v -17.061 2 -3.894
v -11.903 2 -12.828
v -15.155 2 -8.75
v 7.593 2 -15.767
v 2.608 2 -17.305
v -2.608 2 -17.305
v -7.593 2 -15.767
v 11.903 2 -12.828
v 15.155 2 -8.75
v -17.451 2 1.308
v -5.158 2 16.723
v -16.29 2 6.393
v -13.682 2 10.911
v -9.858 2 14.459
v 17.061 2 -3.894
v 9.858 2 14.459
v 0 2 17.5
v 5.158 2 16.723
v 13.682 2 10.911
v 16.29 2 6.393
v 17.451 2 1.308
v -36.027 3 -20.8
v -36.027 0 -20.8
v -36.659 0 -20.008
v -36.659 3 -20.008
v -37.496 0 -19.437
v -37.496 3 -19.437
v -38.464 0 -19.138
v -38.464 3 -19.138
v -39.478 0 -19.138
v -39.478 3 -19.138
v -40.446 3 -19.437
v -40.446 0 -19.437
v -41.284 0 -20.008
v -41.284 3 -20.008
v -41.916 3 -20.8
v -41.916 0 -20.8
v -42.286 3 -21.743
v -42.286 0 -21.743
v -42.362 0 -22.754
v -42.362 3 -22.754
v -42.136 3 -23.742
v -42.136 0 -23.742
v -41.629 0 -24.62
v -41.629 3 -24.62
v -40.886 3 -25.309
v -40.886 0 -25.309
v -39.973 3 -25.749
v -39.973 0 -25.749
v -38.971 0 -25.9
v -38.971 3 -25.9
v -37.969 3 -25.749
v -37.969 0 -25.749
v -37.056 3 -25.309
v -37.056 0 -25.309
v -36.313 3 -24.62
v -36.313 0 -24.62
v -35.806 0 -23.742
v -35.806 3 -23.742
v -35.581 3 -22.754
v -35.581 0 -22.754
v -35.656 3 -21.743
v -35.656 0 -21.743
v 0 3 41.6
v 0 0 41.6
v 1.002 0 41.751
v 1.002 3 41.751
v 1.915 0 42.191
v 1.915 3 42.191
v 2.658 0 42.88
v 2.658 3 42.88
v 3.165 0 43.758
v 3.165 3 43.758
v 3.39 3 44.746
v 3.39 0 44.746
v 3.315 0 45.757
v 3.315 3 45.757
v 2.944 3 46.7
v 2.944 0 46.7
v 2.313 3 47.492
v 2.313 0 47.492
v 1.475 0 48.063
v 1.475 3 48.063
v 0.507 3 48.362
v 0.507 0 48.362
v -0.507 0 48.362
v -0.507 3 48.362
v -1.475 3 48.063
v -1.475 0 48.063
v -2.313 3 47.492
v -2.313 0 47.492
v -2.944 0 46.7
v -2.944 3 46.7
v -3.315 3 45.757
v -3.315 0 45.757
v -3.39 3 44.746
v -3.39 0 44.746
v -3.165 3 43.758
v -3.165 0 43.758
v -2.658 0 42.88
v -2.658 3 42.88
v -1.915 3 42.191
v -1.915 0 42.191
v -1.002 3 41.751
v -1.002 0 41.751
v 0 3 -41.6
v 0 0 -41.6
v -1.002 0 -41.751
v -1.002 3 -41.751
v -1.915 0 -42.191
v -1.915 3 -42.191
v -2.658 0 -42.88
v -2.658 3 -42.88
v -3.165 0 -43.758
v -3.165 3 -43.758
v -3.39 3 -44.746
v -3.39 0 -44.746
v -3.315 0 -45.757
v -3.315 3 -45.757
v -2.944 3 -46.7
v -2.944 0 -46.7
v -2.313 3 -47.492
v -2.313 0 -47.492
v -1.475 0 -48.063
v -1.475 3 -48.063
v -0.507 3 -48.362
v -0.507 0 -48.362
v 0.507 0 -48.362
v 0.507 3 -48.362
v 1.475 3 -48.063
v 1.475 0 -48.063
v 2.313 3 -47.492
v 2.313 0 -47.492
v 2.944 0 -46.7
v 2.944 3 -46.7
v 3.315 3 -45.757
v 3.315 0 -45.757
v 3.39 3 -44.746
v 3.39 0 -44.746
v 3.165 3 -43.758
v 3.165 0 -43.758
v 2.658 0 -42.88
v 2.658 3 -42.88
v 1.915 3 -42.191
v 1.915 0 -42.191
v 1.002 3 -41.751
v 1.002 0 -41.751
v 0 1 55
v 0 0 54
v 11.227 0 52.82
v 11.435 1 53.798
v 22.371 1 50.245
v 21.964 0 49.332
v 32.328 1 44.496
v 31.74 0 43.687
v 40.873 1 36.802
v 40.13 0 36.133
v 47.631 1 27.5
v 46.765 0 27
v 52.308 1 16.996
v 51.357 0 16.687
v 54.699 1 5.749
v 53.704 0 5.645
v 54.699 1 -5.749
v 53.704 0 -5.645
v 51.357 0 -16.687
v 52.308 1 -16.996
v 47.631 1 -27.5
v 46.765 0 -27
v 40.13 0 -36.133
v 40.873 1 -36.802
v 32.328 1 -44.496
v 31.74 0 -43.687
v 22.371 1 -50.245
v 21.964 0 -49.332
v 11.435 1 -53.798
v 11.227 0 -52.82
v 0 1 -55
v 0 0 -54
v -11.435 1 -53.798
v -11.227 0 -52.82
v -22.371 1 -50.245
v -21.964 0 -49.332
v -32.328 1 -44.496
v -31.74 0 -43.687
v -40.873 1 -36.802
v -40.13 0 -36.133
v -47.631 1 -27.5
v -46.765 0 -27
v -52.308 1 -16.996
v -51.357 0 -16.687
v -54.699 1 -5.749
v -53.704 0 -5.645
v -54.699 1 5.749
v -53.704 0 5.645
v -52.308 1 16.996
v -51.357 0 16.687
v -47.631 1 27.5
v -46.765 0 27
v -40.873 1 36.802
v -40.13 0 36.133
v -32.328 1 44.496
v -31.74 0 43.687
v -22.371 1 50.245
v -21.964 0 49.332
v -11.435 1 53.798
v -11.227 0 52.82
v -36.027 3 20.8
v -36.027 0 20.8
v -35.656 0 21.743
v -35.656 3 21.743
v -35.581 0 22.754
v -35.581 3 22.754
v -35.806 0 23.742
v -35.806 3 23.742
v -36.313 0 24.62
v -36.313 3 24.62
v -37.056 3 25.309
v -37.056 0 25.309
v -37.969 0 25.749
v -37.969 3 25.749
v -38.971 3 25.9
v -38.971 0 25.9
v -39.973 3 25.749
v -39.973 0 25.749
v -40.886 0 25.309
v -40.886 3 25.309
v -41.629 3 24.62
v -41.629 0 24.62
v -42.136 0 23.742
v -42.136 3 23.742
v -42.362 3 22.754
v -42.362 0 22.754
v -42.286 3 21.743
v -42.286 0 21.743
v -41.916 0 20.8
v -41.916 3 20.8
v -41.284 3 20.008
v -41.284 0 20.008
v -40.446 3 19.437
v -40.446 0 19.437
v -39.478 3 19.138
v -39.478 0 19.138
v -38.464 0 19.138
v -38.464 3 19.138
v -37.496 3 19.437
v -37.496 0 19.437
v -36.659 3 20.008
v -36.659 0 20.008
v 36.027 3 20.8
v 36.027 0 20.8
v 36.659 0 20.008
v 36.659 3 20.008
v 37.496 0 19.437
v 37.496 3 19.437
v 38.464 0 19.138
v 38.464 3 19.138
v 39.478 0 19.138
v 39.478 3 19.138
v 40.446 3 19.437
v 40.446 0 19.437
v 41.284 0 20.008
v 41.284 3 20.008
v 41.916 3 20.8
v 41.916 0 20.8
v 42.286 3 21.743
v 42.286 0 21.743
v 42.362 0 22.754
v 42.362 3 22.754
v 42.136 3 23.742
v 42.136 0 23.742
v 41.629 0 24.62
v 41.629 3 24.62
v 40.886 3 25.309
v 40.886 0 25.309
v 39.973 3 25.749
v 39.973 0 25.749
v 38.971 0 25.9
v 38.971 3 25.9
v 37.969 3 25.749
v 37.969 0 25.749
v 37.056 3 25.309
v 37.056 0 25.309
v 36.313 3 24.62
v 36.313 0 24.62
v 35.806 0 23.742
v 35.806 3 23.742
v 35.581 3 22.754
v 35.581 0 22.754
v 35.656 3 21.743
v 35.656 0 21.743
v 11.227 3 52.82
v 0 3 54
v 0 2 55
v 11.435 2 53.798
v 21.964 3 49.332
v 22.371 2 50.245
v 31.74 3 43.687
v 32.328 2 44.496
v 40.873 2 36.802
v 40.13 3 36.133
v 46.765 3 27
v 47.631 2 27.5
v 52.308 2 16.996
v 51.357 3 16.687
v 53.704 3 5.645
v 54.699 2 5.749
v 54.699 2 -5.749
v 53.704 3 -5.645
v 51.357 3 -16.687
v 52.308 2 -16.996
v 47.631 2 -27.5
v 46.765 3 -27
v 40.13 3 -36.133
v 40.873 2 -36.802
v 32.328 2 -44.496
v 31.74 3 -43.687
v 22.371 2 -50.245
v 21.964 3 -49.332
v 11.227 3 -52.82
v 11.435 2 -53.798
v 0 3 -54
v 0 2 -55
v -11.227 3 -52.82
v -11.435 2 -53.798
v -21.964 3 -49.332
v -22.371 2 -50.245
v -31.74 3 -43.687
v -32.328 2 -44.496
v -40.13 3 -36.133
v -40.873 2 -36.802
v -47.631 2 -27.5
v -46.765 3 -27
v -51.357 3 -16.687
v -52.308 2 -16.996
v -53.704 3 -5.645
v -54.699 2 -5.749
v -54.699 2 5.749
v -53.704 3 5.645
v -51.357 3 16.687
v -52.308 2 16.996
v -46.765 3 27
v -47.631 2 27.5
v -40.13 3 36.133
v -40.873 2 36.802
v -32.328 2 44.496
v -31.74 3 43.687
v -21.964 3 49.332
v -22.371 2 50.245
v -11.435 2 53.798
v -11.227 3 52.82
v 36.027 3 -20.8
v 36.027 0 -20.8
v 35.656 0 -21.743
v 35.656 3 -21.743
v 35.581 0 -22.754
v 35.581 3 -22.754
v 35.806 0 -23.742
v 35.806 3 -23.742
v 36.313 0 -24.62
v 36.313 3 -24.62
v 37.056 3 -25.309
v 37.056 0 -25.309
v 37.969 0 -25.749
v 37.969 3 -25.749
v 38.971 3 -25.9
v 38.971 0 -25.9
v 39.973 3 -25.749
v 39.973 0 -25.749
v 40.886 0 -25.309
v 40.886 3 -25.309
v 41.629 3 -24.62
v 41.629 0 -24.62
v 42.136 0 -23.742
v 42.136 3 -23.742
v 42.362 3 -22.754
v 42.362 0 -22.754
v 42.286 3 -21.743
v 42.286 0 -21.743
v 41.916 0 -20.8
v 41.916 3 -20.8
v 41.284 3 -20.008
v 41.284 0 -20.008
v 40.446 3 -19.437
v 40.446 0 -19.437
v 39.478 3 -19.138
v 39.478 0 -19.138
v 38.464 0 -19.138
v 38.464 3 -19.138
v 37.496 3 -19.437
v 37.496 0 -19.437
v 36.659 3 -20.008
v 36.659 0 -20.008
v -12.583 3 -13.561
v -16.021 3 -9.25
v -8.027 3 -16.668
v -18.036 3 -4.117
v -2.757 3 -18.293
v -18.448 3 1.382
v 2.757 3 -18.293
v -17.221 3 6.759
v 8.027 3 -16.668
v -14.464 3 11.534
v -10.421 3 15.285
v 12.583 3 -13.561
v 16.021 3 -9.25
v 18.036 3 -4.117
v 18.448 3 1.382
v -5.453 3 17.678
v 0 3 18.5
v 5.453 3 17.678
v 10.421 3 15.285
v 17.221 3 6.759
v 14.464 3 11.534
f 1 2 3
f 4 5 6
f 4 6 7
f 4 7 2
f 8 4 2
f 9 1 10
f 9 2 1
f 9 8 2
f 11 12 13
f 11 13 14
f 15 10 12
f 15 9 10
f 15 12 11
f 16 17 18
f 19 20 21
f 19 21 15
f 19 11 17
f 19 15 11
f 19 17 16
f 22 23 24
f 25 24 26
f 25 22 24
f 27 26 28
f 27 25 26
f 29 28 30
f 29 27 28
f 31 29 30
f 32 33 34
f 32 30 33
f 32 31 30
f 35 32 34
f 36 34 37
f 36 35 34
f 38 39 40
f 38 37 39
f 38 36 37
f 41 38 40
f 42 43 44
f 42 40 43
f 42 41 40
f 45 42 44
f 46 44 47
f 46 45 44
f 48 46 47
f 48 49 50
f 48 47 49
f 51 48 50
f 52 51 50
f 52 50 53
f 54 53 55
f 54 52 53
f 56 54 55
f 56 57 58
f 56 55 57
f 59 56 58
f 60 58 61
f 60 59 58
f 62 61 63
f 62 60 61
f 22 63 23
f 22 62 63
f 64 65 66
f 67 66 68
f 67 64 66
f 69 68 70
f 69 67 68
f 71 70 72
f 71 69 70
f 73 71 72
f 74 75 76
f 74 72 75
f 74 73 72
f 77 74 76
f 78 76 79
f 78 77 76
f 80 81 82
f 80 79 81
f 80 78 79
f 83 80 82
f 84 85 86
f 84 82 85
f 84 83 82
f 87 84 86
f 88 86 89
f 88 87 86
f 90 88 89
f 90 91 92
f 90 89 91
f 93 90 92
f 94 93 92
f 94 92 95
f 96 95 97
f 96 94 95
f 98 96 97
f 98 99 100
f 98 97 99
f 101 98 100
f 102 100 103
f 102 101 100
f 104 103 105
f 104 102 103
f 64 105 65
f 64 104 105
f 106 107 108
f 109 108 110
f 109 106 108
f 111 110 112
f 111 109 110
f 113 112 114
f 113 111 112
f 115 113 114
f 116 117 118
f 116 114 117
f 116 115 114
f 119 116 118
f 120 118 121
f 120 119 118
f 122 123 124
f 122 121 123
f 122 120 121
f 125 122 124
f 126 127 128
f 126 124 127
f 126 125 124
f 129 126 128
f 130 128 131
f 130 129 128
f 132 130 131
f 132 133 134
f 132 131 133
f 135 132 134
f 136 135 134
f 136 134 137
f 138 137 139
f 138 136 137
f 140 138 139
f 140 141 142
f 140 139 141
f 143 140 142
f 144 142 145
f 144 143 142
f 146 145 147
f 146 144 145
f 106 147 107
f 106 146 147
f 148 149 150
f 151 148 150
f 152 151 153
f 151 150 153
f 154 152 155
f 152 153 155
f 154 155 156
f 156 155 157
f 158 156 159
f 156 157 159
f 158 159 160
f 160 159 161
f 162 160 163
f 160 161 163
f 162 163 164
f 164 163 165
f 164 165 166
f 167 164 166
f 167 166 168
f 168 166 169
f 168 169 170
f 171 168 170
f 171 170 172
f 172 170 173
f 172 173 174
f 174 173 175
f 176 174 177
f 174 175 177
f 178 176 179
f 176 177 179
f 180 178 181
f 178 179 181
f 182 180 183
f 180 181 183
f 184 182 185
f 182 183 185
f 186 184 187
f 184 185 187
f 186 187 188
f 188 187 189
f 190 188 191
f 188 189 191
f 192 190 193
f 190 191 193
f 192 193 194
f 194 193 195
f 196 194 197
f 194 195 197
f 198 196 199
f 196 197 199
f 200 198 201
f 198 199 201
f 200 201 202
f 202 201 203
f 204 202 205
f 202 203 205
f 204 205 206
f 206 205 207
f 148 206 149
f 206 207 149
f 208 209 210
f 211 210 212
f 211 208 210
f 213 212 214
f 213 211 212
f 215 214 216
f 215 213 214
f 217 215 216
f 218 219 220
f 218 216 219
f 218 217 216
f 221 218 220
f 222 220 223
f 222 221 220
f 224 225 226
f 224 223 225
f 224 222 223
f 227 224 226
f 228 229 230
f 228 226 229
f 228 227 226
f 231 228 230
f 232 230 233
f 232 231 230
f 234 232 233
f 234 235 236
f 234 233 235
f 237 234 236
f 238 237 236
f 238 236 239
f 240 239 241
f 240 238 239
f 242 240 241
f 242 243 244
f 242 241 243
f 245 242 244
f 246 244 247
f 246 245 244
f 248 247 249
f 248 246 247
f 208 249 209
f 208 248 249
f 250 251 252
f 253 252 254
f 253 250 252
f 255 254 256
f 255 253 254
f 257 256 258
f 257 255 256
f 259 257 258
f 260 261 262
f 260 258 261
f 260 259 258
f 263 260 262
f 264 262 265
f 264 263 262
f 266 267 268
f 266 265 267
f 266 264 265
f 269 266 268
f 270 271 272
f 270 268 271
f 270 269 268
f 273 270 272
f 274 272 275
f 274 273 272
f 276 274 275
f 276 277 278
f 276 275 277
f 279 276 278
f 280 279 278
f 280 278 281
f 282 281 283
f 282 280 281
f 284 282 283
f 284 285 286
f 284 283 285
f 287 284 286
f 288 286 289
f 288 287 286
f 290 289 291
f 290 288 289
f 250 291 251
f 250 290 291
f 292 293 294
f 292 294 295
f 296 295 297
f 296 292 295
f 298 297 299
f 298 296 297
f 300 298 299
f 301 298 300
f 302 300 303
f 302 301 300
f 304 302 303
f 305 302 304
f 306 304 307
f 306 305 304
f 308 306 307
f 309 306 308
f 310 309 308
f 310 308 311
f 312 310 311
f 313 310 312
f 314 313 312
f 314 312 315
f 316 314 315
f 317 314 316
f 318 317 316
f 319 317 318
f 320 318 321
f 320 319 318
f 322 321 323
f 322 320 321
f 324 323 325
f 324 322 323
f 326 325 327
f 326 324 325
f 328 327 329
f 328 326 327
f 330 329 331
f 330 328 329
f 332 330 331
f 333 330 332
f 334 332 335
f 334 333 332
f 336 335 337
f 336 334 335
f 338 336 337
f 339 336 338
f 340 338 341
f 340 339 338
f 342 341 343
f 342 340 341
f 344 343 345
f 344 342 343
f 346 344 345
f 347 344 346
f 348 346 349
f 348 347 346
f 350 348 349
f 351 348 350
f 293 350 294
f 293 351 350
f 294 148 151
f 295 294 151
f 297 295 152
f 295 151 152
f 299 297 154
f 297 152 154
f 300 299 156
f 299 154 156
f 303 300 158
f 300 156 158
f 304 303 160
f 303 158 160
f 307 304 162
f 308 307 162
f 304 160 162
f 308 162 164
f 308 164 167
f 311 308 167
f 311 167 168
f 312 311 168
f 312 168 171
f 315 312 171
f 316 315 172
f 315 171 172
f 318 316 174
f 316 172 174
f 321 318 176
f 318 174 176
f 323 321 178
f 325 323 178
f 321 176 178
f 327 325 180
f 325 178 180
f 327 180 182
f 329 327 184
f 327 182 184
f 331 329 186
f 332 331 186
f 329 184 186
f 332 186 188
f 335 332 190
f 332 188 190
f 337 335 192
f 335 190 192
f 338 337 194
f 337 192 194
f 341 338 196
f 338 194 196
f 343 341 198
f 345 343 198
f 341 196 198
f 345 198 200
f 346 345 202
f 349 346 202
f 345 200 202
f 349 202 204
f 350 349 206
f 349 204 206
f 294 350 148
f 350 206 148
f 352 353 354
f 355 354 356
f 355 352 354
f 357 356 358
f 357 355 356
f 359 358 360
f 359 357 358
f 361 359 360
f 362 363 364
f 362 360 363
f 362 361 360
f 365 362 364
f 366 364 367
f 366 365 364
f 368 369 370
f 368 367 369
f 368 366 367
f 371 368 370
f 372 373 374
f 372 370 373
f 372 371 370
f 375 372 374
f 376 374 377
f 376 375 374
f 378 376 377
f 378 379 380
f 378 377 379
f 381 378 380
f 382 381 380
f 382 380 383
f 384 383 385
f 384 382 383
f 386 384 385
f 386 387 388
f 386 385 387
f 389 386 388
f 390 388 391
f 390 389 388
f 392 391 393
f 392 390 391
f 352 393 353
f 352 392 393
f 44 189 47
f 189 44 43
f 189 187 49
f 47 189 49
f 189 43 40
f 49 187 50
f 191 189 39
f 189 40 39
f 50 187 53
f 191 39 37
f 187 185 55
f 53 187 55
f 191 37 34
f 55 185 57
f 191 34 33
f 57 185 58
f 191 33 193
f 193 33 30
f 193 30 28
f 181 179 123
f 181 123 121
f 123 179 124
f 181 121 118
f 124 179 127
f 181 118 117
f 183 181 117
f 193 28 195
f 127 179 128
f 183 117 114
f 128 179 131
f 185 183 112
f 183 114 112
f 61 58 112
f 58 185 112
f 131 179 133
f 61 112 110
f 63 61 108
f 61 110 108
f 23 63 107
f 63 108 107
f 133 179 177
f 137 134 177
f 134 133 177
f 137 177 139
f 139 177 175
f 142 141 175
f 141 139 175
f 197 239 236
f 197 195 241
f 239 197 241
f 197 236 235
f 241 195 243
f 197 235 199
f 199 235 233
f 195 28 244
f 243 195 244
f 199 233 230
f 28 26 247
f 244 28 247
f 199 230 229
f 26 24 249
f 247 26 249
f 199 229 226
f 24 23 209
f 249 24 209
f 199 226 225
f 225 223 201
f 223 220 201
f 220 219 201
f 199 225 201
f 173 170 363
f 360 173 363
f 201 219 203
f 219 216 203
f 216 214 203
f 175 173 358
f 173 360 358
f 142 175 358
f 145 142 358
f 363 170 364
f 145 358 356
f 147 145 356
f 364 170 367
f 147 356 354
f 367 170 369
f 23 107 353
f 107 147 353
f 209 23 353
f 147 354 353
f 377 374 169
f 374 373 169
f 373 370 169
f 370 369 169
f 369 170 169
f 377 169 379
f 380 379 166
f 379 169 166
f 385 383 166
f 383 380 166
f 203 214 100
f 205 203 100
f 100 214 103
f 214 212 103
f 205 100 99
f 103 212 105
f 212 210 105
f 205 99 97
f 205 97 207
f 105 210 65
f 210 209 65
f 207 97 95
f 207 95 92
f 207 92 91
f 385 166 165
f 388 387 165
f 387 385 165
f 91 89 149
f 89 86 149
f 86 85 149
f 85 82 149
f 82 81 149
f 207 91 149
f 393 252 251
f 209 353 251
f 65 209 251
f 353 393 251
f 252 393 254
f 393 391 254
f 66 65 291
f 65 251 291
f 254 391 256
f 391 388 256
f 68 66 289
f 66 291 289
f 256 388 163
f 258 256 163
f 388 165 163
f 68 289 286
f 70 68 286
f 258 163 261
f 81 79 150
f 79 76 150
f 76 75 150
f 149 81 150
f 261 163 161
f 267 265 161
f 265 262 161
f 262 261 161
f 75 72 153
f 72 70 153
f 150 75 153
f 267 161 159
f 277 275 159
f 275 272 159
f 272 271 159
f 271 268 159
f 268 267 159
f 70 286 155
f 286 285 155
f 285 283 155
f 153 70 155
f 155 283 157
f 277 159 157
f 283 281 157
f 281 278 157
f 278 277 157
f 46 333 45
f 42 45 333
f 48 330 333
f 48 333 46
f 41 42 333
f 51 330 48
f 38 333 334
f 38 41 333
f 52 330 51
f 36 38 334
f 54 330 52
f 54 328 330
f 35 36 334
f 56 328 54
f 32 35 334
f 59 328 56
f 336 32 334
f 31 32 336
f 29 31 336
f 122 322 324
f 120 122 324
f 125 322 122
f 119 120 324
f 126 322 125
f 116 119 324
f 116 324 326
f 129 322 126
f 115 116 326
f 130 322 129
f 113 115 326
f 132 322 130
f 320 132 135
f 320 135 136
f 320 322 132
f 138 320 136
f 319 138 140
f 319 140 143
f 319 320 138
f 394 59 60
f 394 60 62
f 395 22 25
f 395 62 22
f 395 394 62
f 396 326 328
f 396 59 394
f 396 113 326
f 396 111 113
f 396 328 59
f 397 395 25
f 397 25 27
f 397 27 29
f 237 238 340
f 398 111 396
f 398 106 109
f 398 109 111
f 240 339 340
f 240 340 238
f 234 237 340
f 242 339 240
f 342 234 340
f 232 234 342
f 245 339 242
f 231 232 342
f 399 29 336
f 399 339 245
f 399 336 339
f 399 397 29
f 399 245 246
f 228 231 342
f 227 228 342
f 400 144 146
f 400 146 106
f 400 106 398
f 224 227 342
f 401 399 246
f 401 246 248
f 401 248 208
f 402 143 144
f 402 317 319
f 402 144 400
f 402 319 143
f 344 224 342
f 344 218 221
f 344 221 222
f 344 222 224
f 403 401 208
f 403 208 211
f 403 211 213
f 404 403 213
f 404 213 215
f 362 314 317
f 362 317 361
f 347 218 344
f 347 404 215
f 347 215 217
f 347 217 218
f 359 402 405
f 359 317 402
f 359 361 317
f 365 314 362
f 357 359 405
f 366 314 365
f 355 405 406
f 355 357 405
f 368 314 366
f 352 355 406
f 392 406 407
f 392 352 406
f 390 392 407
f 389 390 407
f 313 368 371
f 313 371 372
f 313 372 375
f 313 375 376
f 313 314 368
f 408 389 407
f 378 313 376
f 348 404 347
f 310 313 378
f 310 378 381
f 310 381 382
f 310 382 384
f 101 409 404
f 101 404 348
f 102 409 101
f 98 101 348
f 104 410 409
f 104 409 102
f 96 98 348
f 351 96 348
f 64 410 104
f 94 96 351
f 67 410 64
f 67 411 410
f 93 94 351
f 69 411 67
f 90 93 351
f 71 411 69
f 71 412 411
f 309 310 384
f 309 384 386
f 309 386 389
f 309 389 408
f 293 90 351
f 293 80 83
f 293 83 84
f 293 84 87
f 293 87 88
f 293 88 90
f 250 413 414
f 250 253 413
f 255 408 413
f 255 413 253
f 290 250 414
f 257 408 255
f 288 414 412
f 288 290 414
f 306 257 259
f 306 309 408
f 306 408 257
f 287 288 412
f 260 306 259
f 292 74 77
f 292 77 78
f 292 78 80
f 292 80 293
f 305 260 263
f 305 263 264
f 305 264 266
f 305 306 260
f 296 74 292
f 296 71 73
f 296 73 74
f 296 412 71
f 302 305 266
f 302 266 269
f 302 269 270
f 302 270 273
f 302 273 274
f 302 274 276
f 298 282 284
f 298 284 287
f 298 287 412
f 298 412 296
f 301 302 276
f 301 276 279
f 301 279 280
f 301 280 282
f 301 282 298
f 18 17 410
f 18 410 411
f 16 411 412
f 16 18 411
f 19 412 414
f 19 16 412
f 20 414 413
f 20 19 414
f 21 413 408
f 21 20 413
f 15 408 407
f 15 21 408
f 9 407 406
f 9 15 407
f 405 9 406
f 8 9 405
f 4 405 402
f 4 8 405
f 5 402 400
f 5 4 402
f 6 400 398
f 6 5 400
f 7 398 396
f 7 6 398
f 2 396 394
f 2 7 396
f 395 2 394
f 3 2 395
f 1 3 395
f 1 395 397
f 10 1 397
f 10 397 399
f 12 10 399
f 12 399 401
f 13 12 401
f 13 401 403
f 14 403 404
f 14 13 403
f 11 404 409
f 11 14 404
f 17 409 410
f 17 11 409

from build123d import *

# Parameters (mm, degrees)
SKETCH_1_R               = 55
EXTRUDE_1_DEPTH          = 3
PATTERN_CIRCULAR_1_COUNT = 6
SKETCH_5_R               = 17.5
CUT_EXTRUDE_1_DEPTH      = 1
CHAMFER_1_SIZE           = 1


with BuildPart() as part:
    # 草图1 → 凸台-拉伸1 (new body)
    with BuildSketch(Plane(origin=(0, 0, 0), x_dir=(1, 0, 0), z_dir=(0, 1, 0))):
        with Locations(Location((0, 0, 0), (0, 0, 270))):
            Circle(SKETCH_1_R)
    extrude(amount=EXTRUDE_1_DEPTH)

    # 草图4 → M8 螺纹孔的螺纹孔钻头1 (revolve, cut)
    with BuildSketch(Plane(origin=(0, 3, -45), x_dir=(0, 0, 1), z_dir=(1, 0, 0))):
        Polygon((0, 0), (0, 18.042926105), (3.4, 16), (3.4, 0), align=None)
    hole_wizard_m8_1 = revolve(axis=Axis((0, 9.35, -45), (0, -1, 0)), mode=Mode.SUBTRACT)

    # 阵列(圆周)1: M8 螺纹孔的螺纹孔钻头1 ×6 about axis
    pattern_circular_1_axis = Axis((0, 0, 0), (0, 1, 0))
    for i in range(1, PATTERN_CIRCULAR_1_COUNT):
        add(hole_wizard_m8_1.rotate(pattern_circular_1_axis, i * 360 / PATTERN_CIRCULAR_1_COUNT), mode=Mode.SUBTRACT)

    # 草图5 → 切除-拉伸1 (cut)
    with BuildSketch(Plane(origin=(0, 3, 0), x_dir=(1, 0, 0), z_dir=(0, 1, 0))):
        with Locations(Location((0, 0, 0), (0, 0, 270))):
            Circle(SKETCH_5_R)
    extrude(amount=-CUT_EXTRUDE_1_DEPTH, mode=Mode.SUBTRACT)

    # 倒角1
    chamfer_1_edges = [part.edges().sort_by_distance(p)[0] for p in [
        (0, 0, -55),
        (0, 3, -17.5),
        (0, 3, -55),
    ]]
    chamfer(chamfer_1_edges, length=CHAMFER_1_SIZE - 0.0001)  # a hair under: the kernel refuses the full size


solid = part.part
